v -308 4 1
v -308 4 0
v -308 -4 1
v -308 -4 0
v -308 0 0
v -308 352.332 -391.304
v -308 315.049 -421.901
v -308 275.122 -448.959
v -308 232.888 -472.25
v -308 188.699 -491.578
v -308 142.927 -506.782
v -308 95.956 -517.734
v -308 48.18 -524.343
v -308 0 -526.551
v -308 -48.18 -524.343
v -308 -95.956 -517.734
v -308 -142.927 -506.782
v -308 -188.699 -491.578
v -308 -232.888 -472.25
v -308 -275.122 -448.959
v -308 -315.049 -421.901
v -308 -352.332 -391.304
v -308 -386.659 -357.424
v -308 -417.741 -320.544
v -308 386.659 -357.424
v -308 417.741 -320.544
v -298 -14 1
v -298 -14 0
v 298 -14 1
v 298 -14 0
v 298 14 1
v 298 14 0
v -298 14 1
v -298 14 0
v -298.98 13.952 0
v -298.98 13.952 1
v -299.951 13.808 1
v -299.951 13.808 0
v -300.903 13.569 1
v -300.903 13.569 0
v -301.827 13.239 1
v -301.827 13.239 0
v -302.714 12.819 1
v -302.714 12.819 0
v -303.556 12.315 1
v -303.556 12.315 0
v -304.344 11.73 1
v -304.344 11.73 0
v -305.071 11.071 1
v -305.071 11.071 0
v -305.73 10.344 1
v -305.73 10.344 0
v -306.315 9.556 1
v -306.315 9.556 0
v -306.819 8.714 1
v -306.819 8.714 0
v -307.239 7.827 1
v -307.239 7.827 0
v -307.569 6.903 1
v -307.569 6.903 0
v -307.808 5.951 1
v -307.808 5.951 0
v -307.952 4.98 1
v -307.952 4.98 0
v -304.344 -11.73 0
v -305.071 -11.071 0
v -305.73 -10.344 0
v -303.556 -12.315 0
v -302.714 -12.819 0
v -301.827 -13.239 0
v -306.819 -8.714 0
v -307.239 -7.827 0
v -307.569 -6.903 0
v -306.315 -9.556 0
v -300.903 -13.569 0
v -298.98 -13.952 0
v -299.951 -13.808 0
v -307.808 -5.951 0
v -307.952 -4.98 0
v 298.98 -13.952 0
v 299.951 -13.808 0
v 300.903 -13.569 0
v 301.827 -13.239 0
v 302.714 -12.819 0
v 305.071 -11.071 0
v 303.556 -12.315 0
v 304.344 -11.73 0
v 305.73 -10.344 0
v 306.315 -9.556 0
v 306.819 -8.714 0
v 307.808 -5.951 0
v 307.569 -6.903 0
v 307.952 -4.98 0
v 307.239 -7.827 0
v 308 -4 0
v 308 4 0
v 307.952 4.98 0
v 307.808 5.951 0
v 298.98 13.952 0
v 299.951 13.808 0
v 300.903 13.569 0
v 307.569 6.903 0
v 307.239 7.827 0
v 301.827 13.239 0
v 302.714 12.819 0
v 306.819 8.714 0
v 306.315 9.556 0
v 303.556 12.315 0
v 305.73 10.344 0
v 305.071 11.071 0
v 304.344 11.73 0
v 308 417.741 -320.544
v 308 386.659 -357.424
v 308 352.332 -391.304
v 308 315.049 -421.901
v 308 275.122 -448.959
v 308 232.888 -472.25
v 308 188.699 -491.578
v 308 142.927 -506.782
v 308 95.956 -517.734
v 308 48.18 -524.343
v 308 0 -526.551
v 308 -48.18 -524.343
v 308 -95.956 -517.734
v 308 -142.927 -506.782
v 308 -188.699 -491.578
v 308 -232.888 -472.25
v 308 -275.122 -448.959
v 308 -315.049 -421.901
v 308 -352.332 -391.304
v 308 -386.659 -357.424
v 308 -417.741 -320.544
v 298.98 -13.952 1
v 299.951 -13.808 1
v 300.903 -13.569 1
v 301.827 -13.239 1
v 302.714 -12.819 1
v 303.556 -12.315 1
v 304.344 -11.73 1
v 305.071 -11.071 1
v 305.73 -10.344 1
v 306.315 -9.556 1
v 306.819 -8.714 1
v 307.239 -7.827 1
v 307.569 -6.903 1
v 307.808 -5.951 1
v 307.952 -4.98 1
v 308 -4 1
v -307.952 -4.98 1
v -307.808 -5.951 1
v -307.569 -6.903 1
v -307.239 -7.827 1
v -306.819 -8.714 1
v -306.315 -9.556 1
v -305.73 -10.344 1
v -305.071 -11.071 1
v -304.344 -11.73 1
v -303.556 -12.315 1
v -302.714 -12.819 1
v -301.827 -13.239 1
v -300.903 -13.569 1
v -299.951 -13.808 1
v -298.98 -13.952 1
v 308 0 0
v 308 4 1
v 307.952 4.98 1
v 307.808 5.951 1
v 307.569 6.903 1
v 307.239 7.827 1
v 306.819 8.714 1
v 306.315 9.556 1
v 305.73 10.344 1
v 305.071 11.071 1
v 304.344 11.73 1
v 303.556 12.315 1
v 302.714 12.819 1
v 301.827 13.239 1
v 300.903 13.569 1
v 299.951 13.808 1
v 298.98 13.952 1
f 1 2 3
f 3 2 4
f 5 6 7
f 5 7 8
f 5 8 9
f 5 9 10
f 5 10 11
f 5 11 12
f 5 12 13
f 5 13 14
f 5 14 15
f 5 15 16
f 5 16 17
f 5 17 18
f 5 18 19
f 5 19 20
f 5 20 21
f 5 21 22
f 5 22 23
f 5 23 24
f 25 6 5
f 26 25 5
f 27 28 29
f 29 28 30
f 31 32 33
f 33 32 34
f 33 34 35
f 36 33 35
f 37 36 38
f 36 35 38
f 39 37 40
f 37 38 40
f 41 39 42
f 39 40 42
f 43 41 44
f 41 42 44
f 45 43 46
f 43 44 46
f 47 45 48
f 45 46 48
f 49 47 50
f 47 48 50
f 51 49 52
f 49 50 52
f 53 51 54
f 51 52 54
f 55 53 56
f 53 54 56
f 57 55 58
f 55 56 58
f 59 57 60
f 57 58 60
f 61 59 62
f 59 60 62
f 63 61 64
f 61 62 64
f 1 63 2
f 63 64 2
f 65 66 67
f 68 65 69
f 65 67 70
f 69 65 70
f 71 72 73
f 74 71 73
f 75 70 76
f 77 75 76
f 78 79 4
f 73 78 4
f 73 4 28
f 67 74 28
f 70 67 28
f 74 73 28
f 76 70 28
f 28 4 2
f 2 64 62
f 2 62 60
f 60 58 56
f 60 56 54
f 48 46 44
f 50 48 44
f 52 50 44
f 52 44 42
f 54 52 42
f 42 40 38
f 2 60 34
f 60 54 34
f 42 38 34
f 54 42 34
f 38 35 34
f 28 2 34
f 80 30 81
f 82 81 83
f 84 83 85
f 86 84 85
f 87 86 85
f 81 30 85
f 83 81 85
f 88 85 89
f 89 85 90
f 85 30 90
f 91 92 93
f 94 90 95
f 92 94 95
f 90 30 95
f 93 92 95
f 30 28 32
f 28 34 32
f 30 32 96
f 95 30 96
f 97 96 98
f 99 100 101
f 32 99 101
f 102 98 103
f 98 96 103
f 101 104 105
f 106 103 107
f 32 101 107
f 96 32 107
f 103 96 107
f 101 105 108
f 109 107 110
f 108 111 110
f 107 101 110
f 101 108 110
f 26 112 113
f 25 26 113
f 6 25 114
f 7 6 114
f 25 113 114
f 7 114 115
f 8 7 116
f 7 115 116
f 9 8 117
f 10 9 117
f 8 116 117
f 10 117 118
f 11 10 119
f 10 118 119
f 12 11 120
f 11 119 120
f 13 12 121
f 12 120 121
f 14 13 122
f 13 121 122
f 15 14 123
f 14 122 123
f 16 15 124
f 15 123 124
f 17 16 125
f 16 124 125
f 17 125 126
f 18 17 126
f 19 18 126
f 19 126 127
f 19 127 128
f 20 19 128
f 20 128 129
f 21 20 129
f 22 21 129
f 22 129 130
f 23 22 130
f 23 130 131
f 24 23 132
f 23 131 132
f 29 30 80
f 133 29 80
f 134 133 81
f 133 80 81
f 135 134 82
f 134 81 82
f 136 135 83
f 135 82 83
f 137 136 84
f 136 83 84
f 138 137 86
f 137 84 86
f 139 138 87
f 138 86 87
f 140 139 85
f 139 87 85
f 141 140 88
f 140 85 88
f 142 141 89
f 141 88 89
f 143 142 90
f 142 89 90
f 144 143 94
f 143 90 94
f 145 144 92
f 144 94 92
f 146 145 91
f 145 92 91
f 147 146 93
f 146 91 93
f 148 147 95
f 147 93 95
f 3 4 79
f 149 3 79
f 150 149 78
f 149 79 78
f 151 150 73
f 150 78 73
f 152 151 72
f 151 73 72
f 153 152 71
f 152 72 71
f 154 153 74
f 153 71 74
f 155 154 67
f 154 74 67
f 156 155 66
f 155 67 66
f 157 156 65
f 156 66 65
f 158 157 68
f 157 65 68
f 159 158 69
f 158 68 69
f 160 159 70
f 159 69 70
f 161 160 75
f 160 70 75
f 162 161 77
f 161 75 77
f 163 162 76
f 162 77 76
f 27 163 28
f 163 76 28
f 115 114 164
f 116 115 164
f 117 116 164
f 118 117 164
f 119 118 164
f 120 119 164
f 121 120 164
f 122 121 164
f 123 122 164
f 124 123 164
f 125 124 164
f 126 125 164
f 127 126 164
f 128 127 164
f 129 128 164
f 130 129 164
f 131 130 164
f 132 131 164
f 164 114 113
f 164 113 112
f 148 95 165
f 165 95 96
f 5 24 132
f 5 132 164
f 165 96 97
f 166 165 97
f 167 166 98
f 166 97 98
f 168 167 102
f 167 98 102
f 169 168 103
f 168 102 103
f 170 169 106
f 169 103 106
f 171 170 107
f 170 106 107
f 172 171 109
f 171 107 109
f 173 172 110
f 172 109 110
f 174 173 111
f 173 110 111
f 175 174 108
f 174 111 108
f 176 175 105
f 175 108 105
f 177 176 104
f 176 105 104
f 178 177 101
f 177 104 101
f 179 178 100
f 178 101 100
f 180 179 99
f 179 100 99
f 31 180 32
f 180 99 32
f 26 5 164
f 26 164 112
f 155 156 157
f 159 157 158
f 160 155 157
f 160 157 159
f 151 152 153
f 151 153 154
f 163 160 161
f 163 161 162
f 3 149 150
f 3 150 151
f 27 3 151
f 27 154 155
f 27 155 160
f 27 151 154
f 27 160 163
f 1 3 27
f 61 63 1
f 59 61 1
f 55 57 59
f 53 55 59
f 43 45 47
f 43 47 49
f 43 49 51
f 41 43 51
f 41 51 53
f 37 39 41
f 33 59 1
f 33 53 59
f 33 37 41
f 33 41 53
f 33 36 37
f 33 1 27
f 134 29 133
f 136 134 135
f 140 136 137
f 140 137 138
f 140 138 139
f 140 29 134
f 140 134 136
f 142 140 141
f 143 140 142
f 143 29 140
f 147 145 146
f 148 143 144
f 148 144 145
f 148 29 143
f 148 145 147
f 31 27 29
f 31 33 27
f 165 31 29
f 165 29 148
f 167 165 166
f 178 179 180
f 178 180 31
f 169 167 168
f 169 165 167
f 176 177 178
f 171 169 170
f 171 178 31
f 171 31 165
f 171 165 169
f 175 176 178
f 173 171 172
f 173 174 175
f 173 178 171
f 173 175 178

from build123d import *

# Parameters (mm, degrees)
BOSS_EXTRU_1_DEPTH = 1
BOSS_EXTRU_2_DEPTH = 616


with BuildPart() as part:
    # Esquisse1 → Boss.-Extru.1 (new body)
    with BuildSketch(Plane.XY):
        with BuildLine():
            Line((-298, -14), (298, -14))
            ThreePointArc((298, -14), (305.071067812, -11.071067812), (308, -4))
            Line((308, -4), (308, 4))
            ThreePointArc((308, 4), (305.071067812, 11.071067812), (298, 14))
            Line((298, 14), (-298, 14))
            ThreePointArc((-298, 14), (-305.071067812, 11.071067812), (-308, 4))
            Line((-308, 4), (-308, -4))
            ThreePointArc((-308, -4), (-305.071067812, -11.071067812), (-298, -14))
        make_face()
    extrude(amount=BOSS_EXTRU_1_DEPTH)


with BuildPart() as body_2:
    # Esquisse3 → Boss.-Extru.2 (new, through all)
    with BuildSketch(Plane(origin=(308, 0, 0), x_dir=(0, 0, -1), z_dir=(1, 0, 0))):
        with BuildLine():
            Line((0, 0), (320.54421388, 417.741352646))
            ThreePointArc((320.54421388, 417.741352646), (526.551451202, 0), (320.54421388, -417.741352646))
            Line((320.54421388, -417.741352646), (0, 0))
        make_face()
    extrude(amount=-BOSS_EXTRU_2_DEPTH)


solid = Compound([part.part, body_2.part])
